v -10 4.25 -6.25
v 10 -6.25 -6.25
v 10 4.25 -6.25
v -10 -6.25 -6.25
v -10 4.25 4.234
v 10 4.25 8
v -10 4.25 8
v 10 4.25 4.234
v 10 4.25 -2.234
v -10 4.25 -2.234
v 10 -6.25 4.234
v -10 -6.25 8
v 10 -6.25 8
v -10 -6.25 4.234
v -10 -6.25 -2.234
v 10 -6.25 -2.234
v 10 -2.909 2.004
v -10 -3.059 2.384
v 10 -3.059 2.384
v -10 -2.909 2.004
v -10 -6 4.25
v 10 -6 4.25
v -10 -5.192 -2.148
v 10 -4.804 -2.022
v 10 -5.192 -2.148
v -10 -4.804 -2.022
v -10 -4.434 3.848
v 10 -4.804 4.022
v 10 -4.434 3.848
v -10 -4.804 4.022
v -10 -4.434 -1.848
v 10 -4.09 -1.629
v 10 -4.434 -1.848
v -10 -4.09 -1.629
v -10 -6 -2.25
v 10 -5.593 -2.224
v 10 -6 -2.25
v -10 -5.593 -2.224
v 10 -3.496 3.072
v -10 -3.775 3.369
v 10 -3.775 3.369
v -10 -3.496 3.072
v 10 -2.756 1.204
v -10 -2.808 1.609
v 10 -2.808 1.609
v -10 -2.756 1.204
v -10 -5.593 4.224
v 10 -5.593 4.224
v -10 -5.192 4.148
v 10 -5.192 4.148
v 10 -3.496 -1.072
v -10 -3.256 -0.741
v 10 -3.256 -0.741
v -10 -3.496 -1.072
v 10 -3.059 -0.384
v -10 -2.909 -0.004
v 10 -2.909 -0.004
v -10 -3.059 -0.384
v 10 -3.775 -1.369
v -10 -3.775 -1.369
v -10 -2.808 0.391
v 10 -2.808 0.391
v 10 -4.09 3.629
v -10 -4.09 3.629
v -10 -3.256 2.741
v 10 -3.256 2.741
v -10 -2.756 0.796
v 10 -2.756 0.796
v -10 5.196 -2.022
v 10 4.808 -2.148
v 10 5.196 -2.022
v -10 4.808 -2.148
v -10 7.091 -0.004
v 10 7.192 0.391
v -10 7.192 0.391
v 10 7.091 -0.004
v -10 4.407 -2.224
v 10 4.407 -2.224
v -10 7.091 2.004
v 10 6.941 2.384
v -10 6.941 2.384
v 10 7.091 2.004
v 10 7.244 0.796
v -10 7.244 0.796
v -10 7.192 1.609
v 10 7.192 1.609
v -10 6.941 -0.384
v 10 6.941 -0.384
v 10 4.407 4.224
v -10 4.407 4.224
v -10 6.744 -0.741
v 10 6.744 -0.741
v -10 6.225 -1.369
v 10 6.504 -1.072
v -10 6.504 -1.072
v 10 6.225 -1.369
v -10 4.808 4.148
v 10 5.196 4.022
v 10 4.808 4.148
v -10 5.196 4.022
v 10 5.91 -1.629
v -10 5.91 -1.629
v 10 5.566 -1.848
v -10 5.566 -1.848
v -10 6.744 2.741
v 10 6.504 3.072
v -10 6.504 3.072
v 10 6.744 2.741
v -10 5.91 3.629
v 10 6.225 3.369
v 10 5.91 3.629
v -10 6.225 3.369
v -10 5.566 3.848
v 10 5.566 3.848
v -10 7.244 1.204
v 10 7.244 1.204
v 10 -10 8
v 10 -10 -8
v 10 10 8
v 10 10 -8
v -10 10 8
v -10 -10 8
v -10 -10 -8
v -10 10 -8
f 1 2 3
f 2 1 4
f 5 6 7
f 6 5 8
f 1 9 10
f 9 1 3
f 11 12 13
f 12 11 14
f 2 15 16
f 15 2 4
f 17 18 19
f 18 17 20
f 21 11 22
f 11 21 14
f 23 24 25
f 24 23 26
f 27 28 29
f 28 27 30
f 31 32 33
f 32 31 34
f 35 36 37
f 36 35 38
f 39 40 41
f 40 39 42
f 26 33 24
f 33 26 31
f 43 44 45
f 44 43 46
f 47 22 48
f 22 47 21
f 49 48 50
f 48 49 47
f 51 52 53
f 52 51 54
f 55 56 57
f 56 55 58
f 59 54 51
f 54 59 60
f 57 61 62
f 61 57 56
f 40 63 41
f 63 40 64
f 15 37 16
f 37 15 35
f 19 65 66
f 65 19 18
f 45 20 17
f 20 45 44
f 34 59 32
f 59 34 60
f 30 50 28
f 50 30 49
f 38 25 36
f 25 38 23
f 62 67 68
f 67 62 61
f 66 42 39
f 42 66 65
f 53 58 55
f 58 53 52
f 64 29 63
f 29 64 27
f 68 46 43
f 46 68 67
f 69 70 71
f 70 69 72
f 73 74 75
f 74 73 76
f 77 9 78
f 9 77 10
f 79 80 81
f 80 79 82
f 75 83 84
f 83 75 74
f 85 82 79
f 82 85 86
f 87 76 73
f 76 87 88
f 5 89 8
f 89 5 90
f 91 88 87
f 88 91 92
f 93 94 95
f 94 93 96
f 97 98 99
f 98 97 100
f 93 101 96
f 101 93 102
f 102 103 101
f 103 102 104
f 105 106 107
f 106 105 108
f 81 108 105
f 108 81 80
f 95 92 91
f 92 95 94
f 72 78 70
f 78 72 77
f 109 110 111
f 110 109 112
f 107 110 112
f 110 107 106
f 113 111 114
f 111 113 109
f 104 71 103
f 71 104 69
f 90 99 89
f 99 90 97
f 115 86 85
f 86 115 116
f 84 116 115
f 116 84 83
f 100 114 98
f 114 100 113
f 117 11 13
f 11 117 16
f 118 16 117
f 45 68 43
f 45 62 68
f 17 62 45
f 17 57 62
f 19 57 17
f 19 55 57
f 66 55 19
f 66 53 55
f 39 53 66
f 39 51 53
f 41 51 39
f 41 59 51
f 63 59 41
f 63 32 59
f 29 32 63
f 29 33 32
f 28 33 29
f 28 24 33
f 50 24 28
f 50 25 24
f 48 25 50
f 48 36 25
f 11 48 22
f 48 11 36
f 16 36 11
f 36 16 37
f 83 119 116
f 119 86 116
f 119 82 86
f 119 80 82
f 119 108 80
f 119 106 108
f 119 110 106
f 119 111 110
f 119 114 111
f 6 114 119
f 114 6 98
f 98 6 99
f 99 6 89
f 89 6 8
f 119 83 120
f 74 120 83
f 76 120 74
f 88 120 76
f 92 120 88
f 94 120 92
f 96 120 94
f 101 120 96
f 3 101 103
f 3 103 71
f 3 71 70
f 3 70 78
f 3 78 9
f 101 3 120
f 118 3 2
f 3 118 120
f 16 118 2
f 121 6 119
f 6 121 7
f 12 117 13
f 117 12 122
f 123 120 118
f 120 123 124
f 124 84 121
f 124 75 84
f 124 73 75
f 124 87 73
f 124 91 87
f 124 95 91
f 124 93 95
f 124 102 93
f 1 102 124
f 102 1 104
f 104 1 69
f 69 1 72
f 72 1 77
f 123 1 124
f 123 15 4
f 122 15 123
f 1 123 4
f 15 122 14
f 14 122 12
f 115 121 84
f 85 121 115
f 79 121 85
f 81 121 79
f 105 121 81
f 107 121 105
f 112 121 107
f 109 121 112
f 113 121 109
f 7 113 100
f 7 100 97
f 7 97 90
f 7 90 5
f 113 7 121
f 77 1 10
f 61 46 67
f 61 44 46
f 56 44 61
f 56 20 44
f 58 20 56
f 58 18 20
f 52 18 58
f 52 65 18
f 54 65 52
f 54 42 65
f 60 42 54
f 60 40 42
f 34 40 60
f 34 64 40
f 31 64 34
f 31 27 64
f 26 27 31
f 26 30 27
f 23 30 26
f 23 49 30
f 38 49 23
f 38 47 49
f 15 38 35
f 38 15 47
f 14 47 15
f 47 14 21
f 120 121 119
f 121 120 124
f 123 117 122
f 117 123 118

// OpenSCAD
// Rack and pinion gears GPL (c) SASA October 2013.
//
// Very simple rack and pinion gear based on GPL code.
//
// I've made corrections to both rack and gear code I used (below) and unified
// and simplified both bits of code.  Corrects the use of circular pitch so
// rack and pinion match nicely.  Ammendments to the code and interface to
// simplify use and improve readability. Many bells and whistles dropped in
// favour of being dead simple.  I also opted for hard wiring the pressure
// angle to 20 degrees since this seemed a kind of standard.
//
// Based on the works (thanks!): Parametric Involute Bevel and Spur Gears by
// GregFrost GNU GPL license.  http://www.thingiverse.com/thing:3575 Parametric
// Modular Rack by Mark "Ckaos" Moissette GNU GPL license.  (Rack based on the
// work of MattMoses and Fdavies
// http://forums.reprap.org/read.php?1,51452,52099#msg-52099 and Forrest Higgs:
// 
// The originals have many fine additions such as helical gears which I've
// dropped in favour of simplicity (as befits my needs) - it wouldn't be a big
// jobs to nobble my changes backwards or their features forwards.
abit=0.01;
pi=3.1415926535897932384626433832795;
$fn=50;

// examples of usage
// include this in your code:
// use <rack_and_pinion.scad>
// then:
// a simple rack

//		rack(10,14,10,15,6);//CP (mm/tooth), width (mm), thickness(of base) (mm), # teeth, lip
difference(){
cube([20,20,16], center=true);
translate([0,-1,1]) rotate([0,0,0])rackCutout(40,14,10,6,.5);
}

//translate([0,-46,0])rotate([0,0,360/10/2]) pinion(10,15,10,19);// cp= circular pitch, # of teeth, width, shaft Diameter


module rack(cp, N, width, thickness, lip=0){
// cp = circular pitch - for rack = pitch in mm/per tooth
// N = number of teeth
// width = width of rack
// thickness = thickness of support under teeth (0 for no support)
// lip = how thick of a radius the goove and nub are
lip =lip/2;

	a = 1.0*cp/pi; // addendum (also known as "module")
	d = 1.1*cp/pi; // dedendum (this is set by a standard)
	height=(d+a);

	// find the tangent of pressure angle once
	tanPA = tan(20);
	// length of bottom and top horizontal segments of tooth profile
	botL = (cp/2 - 2*d*tanPA);
	topL = (cp/2 - 2*a*tanPA);

	slantLng=tanPA*height;
	realBase=2*slantLng+topL;

	offset=topL+botL+2*slantLng;
	length=(realBase+botL)*N;
	echo("length: ", length);
	supportSize=width;
	translate([botL/2,0,0])
	rotate([90,0,0]){
		translate([0,supportSize/2,0]){
			union(){
				difference(){
					cube(size=[length,width,thickness],center=true);
					translate([0,-width/2,0])rotate([0,90,0])cylinder(r=lip,h=length+abit,center=true);
					}
				translate([0,width/2,0])rotate([0,90,0])cylinder(r=lip,h=length,center=true);
				for (i = [0:N-1]){
					translate([i*offset-length/2+realBase/2,0,thickness/2]){
						trapezoid([topL,supportSize],[realBase,supportSize],height);
						}
					}
				}
			}
		}
	}

module rackCutout(length, thickness, width, lip=0, clearance){
// cp = circular pitch - for rack = pitch in mm/per tooth
// N = number of teeth
// width = width of rack
// thickness = thickness of support under teeth (0 for no support)
// lip = how thick of a radius the goove and nub are
	lip =(lip+clearance)/2;

	union(){
		difference(){
			cube(size=[length,width+clearance,thickness+clearance],center=true);
			translate([0,-width/2,0])rotate([0,90,0])cylinder(r=lip,h=length+abit,center=true);
			}
		translate([0,width/2,0])rotate([0,90,0])cylinder(r=lip,h=length,center=true);
	}
}


module pinion (cp, N, width, shaft_diameter, backlash=0){
// cp= circular pitch - for pinion pitch in mm/per as measured along the ptich radius (~1/2 way up tooth)
// N= number of teeth
// width= width of the gear
// shaft_diameter= diameter of hole for shaft
// backlash - I think this is just a bodge for making things fit when printed but I never tested it

	if (cp==false && diametral_pitch==false) 
		echo("MCAD ERROR: pinion module needs either a diametral_pitch or cp");

	//Convert diametrial pitch to our native circular pitch
	cp = (cp!=false?cp:180/diametral_pitch);

	// Pitch diameter: Diameter of pitch circle.
	pitch_diameter  =  N * cp / pi;
	pitch_radius = pitch_diameter/2;
	echo ("Teeth:", N, " Pitch radius:", pitch_radius);
	// Base Circle
	base_radius = pitch_radius*cos(20);

	// Addendum: Radial distance from pitch circle to outside circle.
	addendum = cp/pi;

	//Outer Circle
	outer_radius = pitch_radius+addendum;

	// Dedendum: Radial distance from pitch circle to root diameter
	dedendum = addendum*1.1;

	// Root diameter: Diameter of bottom of tooth spaces.
	root_radius = pitch_radius-dedendum;

	backlash_angle = backlash / pitch_radius * 180 / pi;
	half_thick_angle = (360 / N - backlash_angle) / 4;

	difference(){
		linear_extrude (height=width, convexity=10, twist=0)
		pinion_shape(N, pitch_radius = pitch_radius, root_radius = root_radius,
			base_radius = base_radius, outer_radius = outer_radius,
			half_thick_angle = half_thick_angle, involute_facets=0);

		translate([0,0,-1]) cylinder(r=shaft_diameter/2,h=2+width);
		}

	echo("Root radius =",root_radius,"\nPitch radius=",pitch_radius,"\n Tip radius=",outer_radius,"\n");
	}

module pinion_shape ( N, pitch_radius, root_radius, base_radius, outer_radius, half_thick_angle, involute_facets) {
	union(){
		rotate (half_thick_angle) circle ($fn=N*2, r=root_radius);
		for (i = [1:N]) {
			rotate ([0,0,i*360/N]) {
				involute_pinion_tooth (
					pitch_radius = pitch_radius,
					root_radius = root_radius,
					base_radius = base_radius,
					outer_radius = outer_radius,
					half_thick_angle = half_thick_angle,
					involute_facets=involute_facets);
				}
			}
		}
	}

module involute_pinion_tooth ( pitch_radius, root_radius, base_radius, outer_radius, half_thick_angle, involute_facets) {
	min_radius = max (base_radius,root_radius);

	pitch_point = involute (base_radius, involute_intersect_angle (base_radius, pitch_radius));
	pitch_angle = atan2 (pitch_point[1], pitch_point[0]);
	centre_angle = pitch_angle + half_thick_angle;

	start_angle = involute_intersect_angle (base_radius, min_radius);
	stop_angle = involute_intersect_angle (base_radius, outer_radius);

	res=(involute_facets!=0)?involute_facets:($fn==0)?5:$fn/4;

	union () {
		for (i=[1:res])
		assign ( point1=involute (base_radius,start_angle+(stop_angle - start_angle)*(i-1)/res), point2=involute (base_radius,start_angle+(stop_angle - start_angle)*i/res)) {
			assign (
				side1_point1=rotate_point (centre_angle, point1),
				side1_point2=rotate_point (centre_angle, point2),
				side2_point1=mirror_point (rotate_point (centre_angle, point1)),
				side2_point2=mirror_point (rotate_point (centre_angle, point2))) {
				polygon ( points=[[0,0],side1_point1,side1_point2,side2_point2,side2_point1], paths=[[0,1,2,3,4,0]]);
				}
			}
		}
	}

// Mathematical Functions
//===============

// Finds the angle of the involute about the base radius at the given distance (radius) from it's center.
//source: http://www.mathhelpforum.com/math-help/geometry/136011-circle-involute-solving-y-any-given-x.html

function involute_intersect_angle (base_radius, radius) = sqrt (pow (radius/base_radius, 2) - 1) * 180 / pi;

// Calculate the involute position for a given base radius and involute angle.

function rotated_involute(rotate,base_radius,involute_angle)=[cos(rotate)*involute(base_radius, involute_angle)[0]+sin(rotate)*involute(base_radius, involute_angle)[1],cos(rotate)*involute(base_radius, involute_angle)[1]-sin(rotate)*involute(base_radius, involute_angle)[0]];

function mirror_point(coord)=[coord[0],-coord[1]];

function rotate_point(rotate,coord)=[cos(rotate)*coord[0]+sin(rotate)*coord[1],cos(rotate)*coord[1]-sin(rotate)*coord[0]];

function involute (base_radius, involute_angle)=[base_radius*(cos(involute_angle)+involute_angle*pi/180*sin(involute_angle)),base_radius*(sin(involute_angle)-involute_angle*pi/180*cos(involute_angle))];




module trapezoid(top,base,height){
	//echo ("test",base[0]);
	basePT1=[ -base[0]/2, base[1]/2, 0];
	basePT2=[ base[0]/2, base[1]/2, 0];
	basePT3=[ base[0]/2, -base[1]/2, 0];
	basePT4=[ -base[0]/2, -base[1]/2, 0];
	topPT1=[ -top[0]/2, top[1]/2, height];
	topPT2=[ top[0]/2, top[1]/2, height];
	topPT3=[ top[0]/2, -top[1]/2, height];
	topPT4=[ -top[0]/2, -top[1]/2, height];
	polyhedron(points=[ basePT1, basePT2, basePT3, basePT4, topPT1, topPT2, topPT3, topPT4],triangles=[[0,1,2], [0,2,3],[3,7,0], [7,4,0],[1,6,2], [1,5,6],[2,6,3], [3,6,7],[5,1,0],[4,5,0],[7,5,4],[5,7,6]]);
	}
